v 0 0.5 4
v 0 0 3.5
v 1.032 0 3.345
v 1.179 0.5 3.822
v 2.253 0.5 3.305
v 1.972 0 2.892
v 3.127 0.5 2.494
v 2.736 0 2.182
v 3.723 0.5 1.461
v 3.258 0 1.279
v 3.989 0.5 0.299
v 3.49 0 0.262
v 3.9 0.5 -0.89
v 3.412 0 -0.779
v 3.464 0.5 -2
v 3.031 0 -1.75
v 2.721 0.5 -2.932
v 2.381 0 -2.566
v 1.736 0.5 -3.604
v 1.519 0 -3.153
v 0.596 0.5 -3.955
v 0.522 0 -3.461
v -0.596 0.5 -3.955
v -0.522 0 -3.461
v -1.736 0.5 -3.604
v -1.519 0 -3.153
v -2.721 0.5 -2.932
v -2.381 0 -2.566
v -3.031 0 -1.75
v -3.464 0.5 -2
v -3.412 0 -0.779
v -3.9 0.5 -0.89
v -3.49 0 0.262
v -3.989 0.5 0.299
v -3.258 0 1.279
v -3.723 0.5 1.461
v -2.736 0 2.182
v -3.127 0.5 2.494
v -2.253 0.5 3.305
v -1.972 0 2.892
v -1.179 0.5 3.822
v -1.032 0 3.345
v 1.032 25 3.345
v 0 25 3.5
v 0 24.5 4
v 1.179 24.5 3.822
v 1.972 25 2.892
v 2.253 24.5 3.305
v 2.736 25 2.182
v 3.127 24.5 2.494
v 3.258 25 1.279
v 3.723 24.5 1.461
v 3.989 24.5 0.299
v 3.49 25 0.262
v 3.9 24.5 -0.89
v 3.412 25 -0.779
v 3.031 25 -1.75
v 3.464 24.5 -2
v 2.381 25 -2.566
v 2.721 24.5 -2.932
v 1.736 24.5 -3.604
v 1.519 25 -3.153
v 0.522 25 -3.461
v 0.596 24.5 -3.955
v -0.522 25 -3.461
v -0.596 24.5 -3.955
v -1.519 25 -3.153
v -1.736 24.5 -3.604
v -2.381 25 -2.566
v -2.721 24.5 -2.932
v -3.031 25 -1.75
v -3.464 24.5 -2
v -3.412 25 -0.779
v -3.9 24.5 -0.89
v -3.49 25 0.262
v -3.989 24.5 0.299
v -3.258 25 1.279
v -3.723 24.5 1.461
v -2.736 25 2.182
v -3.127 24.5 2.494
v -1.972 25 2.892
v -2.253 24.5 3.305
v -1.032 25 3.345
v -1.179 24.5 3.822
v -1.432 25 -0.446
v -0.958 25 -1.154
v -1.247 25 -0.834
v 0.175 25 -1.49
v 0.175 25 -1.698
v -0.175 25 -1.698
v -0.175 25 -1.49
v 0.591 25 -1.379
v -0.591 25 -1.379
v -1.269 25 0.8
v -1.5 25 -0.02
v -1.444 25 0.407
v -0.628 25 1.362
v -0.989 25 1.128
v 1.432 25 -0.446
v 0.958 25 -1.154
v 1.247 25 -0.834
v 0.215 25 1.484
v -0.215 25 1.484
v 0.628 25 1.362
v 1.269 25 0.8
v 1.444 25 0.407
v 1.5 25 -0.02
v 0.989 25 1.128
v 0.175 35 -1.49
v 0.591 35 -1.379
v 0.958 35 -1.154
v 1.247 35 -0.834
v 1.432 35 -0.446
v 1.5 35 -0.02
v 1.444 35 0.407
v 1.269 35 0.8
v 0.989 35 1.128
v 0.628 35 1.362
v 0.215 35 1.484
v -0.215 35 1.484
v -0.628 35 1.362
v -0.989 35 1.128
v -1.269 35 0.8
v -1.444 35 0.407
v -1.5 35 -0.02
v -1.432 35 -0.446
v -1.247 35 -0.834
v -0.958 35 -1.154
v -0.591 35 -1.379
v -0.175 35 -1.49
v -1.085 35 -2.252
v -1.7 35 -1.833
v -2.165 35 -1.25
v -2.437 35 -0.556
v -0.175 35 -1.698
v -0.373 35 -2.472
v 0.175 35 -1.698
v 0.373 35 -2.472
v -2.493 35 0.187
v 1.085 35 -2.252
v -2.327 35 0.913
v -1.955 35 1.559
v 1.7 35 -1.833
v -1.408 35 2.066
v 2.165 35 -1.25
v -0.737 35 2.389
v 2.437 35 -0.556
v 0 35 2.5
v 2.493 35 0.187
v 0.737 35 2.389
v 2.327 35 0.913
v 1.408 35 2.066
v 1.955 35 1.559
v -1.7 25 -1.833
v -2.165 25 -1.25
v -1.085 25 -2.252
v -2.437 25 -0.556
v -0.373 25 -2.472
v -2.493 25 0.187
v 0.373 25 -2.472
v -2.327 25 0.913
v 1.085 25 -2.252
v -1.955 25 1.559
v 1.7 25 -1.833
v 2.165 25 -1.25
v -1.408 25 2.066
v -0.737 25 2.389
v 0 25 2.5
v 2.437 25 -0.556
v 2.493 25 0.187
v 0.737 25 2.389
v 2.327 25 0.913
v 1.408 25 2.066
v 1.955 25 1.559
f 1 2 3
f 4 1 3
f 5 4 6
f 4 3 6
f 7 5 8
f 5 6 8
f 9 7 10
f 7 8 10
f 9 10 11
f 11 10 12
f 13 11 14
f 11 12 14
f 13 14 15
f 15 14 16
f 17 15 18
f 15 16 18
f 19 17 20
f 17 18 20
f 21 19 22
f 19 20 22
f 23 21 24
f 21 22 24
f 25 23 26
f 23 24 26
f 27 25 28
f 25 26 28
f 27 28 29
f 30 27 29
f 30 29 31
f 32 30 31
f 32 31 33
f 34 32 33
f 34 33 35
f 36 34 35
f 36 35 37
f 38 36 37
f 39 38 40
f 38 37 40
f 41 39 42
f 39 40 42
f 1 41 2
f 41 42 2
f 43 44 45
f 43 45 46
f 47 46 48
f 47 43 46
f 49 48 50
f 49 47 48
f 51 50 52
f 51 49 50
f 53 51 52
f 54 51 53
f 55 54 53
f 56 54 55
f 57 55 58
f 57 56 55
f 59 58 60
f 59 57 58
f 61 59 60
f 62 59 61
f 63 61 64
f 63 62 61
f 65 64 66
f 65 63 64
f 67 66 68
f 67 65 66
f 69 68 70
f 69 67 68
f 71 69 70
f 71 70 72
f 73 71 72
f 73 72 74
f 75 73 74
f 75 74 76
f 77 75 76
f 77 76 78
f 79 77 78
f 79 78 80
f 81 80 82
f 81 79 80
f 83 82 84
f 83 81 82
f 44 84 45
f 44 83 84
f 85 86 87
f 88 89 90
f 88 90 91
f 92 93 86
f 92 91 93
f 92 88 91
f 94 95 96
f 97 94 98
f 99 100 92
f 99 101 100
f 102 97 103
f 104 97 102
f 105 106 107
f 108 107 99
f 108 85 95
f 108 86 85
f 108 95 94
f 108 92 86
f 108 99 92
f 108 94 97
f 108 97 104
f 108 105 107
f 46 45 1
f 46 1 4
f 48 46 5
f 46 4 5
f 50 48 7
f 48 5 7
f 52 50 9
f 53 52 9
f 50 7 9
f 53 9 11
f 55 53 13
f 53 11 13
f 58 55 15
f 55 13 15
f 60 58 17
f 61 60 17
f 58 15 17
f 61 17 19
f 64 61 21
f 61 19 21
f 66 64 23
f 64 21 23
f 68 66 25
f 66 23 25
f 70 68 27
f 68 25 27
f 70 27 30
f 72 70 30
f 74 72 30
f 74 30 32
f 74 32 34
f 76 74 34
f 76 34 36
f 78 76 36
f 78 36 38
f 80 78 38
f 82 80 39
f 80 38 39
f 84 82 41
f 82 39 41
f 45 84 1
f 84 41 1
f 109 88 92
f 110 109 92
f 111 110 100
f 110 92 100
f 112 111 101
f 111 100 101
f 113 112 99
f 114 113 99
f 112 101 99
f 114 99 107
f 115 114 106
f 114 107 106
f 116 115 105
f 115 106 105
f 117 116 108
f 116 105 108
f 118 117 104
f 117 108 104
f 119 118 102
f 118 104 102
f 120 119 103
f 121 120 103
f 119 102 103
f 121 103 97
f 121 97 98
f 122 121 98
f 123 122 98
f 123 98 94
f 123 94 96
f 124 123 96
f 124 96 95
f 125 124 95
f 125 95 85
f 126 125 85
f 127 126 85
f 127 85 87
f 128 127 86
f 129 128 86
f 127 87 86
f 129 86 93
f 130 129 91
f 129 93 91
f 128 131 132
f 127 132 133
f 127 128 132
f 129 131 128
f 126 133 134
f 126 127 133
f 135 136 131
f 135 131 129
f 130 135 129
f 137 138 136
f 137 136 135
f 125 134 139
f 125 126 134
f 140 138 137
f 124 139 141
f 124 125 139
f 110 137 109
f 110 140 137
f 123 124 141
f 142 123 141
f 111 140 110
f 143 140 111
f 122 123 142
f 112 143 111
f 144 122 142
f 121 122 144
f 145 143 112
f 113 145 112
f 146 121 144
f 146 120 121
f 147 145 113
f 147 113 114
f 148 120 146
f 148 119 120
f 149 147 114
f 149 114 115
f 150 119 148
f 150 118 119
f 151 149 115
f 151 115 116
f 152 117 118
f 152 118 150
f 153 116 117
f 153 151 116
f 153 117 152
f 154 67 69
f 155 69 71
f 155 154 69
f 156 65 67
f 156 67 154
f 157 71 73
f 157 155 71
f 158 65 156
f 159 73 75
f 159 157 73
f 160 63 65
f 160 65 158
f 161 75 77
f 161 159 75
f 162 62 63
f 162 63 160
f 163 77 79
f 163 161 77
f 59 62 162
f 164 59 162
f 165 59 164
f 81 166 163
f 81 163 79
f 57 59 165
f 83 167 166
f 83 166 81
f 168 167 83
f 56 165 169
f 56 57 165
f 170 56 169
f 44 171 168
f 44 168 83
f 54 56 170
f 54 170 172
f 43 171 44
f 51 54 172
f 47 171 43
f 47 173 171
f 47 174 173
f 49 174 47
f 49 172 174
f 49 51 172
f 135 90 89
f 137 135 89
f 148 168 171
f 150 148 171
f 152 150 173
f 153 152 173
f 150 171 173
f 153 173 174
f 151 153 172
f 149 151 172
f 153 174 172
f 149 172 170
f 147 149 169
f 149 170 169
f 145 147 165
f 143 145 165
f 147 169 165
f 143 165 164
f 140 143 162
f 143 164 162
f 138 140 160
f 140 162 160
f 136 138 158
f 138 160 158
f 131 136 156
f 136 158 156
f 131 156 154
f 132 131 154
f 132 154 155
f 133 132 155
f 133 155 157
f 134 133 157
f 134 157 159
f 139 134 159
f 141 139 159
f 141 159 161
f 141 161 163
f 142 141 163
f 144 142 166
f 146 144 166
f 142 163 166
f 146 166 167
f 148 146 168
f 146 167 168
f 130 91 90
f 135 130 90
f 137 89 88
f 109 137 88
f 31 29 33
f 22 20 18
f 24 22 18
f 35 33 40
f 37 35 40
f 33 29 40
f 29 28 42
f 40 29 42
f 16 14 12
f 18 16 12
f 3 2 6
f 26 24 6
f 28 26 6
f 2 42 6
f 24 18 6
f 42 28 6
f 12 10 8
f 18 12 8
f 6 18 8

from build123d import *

# Parameters (mm, degrees)
CROQUIS1_R              = 4
SALIENTE_EXTRUIR1_DEPTH = 25
CROQUIS2_R              = 2.5
SALIENTE_EXTRUIR2_DEPTH = 10
CHAFL_N1_SIZE           = 0.5
CHAFL_N2_SIZE           = 0.5


with BuildPart() as part:
    # Croquis1 → Saliente-Extruir1 (new body)
    with BuildSketch(Plane(origin=(0, 0, 0), x_dir=(1, 0, 0), z_dir=(0, 1, 0))):
        with Locations(Location((0, 0, 0), (0, 0, 270))):
            Circle(CROQUIS1_R)
    extrude(amount=SALIENTE_EXTRUIR1_DEPTH)

    # Croquis2 → Saliente-Extruir2 (add)
    with BuildSketch(Plane(origin=(0, 25, 0), x_dir=(1, 0, 0), z_dir=(0, 1, 0))):
        with Locations(Location((0, 0, 0), (0, 0, 270))):
            Circle(CROQUIS2_R)
        with BuildLine():
            Line((-0.175, 1.489756692), (-0.175, 1.697953702))
            Line((-0.175, 1.697953702), (0.175, 1.697953702))
            Line((0.175, 1.697953702), (0.175, 1.489756692))
            ThreePointArc((0.175, 1.489756692), (0, -1.5), (-0.175, 1.489756692))
        make_face(mode=Mode.SUBTRACT)
    extrude(amount=SALIENTE_EXTRUIR2_DEPTH)

    # Chaflán1
    chafl_n1_edges = [part.edges().sort_by_distance(p)[0] for p in [
        (0, 25, -4),
    ]]
    chamfer(chafl_n1_edges, length=CHAFL_N1_SIZE)

    # Chaflán2
    chafl_n2_edges = [part.edges().sort_by_distance(p)[0] for p in [
        (0, 0, -4),
    ]]
    chamfer(chafl_n2_edges, length=CHAFL_N2_SIZE)


solid = part.part
